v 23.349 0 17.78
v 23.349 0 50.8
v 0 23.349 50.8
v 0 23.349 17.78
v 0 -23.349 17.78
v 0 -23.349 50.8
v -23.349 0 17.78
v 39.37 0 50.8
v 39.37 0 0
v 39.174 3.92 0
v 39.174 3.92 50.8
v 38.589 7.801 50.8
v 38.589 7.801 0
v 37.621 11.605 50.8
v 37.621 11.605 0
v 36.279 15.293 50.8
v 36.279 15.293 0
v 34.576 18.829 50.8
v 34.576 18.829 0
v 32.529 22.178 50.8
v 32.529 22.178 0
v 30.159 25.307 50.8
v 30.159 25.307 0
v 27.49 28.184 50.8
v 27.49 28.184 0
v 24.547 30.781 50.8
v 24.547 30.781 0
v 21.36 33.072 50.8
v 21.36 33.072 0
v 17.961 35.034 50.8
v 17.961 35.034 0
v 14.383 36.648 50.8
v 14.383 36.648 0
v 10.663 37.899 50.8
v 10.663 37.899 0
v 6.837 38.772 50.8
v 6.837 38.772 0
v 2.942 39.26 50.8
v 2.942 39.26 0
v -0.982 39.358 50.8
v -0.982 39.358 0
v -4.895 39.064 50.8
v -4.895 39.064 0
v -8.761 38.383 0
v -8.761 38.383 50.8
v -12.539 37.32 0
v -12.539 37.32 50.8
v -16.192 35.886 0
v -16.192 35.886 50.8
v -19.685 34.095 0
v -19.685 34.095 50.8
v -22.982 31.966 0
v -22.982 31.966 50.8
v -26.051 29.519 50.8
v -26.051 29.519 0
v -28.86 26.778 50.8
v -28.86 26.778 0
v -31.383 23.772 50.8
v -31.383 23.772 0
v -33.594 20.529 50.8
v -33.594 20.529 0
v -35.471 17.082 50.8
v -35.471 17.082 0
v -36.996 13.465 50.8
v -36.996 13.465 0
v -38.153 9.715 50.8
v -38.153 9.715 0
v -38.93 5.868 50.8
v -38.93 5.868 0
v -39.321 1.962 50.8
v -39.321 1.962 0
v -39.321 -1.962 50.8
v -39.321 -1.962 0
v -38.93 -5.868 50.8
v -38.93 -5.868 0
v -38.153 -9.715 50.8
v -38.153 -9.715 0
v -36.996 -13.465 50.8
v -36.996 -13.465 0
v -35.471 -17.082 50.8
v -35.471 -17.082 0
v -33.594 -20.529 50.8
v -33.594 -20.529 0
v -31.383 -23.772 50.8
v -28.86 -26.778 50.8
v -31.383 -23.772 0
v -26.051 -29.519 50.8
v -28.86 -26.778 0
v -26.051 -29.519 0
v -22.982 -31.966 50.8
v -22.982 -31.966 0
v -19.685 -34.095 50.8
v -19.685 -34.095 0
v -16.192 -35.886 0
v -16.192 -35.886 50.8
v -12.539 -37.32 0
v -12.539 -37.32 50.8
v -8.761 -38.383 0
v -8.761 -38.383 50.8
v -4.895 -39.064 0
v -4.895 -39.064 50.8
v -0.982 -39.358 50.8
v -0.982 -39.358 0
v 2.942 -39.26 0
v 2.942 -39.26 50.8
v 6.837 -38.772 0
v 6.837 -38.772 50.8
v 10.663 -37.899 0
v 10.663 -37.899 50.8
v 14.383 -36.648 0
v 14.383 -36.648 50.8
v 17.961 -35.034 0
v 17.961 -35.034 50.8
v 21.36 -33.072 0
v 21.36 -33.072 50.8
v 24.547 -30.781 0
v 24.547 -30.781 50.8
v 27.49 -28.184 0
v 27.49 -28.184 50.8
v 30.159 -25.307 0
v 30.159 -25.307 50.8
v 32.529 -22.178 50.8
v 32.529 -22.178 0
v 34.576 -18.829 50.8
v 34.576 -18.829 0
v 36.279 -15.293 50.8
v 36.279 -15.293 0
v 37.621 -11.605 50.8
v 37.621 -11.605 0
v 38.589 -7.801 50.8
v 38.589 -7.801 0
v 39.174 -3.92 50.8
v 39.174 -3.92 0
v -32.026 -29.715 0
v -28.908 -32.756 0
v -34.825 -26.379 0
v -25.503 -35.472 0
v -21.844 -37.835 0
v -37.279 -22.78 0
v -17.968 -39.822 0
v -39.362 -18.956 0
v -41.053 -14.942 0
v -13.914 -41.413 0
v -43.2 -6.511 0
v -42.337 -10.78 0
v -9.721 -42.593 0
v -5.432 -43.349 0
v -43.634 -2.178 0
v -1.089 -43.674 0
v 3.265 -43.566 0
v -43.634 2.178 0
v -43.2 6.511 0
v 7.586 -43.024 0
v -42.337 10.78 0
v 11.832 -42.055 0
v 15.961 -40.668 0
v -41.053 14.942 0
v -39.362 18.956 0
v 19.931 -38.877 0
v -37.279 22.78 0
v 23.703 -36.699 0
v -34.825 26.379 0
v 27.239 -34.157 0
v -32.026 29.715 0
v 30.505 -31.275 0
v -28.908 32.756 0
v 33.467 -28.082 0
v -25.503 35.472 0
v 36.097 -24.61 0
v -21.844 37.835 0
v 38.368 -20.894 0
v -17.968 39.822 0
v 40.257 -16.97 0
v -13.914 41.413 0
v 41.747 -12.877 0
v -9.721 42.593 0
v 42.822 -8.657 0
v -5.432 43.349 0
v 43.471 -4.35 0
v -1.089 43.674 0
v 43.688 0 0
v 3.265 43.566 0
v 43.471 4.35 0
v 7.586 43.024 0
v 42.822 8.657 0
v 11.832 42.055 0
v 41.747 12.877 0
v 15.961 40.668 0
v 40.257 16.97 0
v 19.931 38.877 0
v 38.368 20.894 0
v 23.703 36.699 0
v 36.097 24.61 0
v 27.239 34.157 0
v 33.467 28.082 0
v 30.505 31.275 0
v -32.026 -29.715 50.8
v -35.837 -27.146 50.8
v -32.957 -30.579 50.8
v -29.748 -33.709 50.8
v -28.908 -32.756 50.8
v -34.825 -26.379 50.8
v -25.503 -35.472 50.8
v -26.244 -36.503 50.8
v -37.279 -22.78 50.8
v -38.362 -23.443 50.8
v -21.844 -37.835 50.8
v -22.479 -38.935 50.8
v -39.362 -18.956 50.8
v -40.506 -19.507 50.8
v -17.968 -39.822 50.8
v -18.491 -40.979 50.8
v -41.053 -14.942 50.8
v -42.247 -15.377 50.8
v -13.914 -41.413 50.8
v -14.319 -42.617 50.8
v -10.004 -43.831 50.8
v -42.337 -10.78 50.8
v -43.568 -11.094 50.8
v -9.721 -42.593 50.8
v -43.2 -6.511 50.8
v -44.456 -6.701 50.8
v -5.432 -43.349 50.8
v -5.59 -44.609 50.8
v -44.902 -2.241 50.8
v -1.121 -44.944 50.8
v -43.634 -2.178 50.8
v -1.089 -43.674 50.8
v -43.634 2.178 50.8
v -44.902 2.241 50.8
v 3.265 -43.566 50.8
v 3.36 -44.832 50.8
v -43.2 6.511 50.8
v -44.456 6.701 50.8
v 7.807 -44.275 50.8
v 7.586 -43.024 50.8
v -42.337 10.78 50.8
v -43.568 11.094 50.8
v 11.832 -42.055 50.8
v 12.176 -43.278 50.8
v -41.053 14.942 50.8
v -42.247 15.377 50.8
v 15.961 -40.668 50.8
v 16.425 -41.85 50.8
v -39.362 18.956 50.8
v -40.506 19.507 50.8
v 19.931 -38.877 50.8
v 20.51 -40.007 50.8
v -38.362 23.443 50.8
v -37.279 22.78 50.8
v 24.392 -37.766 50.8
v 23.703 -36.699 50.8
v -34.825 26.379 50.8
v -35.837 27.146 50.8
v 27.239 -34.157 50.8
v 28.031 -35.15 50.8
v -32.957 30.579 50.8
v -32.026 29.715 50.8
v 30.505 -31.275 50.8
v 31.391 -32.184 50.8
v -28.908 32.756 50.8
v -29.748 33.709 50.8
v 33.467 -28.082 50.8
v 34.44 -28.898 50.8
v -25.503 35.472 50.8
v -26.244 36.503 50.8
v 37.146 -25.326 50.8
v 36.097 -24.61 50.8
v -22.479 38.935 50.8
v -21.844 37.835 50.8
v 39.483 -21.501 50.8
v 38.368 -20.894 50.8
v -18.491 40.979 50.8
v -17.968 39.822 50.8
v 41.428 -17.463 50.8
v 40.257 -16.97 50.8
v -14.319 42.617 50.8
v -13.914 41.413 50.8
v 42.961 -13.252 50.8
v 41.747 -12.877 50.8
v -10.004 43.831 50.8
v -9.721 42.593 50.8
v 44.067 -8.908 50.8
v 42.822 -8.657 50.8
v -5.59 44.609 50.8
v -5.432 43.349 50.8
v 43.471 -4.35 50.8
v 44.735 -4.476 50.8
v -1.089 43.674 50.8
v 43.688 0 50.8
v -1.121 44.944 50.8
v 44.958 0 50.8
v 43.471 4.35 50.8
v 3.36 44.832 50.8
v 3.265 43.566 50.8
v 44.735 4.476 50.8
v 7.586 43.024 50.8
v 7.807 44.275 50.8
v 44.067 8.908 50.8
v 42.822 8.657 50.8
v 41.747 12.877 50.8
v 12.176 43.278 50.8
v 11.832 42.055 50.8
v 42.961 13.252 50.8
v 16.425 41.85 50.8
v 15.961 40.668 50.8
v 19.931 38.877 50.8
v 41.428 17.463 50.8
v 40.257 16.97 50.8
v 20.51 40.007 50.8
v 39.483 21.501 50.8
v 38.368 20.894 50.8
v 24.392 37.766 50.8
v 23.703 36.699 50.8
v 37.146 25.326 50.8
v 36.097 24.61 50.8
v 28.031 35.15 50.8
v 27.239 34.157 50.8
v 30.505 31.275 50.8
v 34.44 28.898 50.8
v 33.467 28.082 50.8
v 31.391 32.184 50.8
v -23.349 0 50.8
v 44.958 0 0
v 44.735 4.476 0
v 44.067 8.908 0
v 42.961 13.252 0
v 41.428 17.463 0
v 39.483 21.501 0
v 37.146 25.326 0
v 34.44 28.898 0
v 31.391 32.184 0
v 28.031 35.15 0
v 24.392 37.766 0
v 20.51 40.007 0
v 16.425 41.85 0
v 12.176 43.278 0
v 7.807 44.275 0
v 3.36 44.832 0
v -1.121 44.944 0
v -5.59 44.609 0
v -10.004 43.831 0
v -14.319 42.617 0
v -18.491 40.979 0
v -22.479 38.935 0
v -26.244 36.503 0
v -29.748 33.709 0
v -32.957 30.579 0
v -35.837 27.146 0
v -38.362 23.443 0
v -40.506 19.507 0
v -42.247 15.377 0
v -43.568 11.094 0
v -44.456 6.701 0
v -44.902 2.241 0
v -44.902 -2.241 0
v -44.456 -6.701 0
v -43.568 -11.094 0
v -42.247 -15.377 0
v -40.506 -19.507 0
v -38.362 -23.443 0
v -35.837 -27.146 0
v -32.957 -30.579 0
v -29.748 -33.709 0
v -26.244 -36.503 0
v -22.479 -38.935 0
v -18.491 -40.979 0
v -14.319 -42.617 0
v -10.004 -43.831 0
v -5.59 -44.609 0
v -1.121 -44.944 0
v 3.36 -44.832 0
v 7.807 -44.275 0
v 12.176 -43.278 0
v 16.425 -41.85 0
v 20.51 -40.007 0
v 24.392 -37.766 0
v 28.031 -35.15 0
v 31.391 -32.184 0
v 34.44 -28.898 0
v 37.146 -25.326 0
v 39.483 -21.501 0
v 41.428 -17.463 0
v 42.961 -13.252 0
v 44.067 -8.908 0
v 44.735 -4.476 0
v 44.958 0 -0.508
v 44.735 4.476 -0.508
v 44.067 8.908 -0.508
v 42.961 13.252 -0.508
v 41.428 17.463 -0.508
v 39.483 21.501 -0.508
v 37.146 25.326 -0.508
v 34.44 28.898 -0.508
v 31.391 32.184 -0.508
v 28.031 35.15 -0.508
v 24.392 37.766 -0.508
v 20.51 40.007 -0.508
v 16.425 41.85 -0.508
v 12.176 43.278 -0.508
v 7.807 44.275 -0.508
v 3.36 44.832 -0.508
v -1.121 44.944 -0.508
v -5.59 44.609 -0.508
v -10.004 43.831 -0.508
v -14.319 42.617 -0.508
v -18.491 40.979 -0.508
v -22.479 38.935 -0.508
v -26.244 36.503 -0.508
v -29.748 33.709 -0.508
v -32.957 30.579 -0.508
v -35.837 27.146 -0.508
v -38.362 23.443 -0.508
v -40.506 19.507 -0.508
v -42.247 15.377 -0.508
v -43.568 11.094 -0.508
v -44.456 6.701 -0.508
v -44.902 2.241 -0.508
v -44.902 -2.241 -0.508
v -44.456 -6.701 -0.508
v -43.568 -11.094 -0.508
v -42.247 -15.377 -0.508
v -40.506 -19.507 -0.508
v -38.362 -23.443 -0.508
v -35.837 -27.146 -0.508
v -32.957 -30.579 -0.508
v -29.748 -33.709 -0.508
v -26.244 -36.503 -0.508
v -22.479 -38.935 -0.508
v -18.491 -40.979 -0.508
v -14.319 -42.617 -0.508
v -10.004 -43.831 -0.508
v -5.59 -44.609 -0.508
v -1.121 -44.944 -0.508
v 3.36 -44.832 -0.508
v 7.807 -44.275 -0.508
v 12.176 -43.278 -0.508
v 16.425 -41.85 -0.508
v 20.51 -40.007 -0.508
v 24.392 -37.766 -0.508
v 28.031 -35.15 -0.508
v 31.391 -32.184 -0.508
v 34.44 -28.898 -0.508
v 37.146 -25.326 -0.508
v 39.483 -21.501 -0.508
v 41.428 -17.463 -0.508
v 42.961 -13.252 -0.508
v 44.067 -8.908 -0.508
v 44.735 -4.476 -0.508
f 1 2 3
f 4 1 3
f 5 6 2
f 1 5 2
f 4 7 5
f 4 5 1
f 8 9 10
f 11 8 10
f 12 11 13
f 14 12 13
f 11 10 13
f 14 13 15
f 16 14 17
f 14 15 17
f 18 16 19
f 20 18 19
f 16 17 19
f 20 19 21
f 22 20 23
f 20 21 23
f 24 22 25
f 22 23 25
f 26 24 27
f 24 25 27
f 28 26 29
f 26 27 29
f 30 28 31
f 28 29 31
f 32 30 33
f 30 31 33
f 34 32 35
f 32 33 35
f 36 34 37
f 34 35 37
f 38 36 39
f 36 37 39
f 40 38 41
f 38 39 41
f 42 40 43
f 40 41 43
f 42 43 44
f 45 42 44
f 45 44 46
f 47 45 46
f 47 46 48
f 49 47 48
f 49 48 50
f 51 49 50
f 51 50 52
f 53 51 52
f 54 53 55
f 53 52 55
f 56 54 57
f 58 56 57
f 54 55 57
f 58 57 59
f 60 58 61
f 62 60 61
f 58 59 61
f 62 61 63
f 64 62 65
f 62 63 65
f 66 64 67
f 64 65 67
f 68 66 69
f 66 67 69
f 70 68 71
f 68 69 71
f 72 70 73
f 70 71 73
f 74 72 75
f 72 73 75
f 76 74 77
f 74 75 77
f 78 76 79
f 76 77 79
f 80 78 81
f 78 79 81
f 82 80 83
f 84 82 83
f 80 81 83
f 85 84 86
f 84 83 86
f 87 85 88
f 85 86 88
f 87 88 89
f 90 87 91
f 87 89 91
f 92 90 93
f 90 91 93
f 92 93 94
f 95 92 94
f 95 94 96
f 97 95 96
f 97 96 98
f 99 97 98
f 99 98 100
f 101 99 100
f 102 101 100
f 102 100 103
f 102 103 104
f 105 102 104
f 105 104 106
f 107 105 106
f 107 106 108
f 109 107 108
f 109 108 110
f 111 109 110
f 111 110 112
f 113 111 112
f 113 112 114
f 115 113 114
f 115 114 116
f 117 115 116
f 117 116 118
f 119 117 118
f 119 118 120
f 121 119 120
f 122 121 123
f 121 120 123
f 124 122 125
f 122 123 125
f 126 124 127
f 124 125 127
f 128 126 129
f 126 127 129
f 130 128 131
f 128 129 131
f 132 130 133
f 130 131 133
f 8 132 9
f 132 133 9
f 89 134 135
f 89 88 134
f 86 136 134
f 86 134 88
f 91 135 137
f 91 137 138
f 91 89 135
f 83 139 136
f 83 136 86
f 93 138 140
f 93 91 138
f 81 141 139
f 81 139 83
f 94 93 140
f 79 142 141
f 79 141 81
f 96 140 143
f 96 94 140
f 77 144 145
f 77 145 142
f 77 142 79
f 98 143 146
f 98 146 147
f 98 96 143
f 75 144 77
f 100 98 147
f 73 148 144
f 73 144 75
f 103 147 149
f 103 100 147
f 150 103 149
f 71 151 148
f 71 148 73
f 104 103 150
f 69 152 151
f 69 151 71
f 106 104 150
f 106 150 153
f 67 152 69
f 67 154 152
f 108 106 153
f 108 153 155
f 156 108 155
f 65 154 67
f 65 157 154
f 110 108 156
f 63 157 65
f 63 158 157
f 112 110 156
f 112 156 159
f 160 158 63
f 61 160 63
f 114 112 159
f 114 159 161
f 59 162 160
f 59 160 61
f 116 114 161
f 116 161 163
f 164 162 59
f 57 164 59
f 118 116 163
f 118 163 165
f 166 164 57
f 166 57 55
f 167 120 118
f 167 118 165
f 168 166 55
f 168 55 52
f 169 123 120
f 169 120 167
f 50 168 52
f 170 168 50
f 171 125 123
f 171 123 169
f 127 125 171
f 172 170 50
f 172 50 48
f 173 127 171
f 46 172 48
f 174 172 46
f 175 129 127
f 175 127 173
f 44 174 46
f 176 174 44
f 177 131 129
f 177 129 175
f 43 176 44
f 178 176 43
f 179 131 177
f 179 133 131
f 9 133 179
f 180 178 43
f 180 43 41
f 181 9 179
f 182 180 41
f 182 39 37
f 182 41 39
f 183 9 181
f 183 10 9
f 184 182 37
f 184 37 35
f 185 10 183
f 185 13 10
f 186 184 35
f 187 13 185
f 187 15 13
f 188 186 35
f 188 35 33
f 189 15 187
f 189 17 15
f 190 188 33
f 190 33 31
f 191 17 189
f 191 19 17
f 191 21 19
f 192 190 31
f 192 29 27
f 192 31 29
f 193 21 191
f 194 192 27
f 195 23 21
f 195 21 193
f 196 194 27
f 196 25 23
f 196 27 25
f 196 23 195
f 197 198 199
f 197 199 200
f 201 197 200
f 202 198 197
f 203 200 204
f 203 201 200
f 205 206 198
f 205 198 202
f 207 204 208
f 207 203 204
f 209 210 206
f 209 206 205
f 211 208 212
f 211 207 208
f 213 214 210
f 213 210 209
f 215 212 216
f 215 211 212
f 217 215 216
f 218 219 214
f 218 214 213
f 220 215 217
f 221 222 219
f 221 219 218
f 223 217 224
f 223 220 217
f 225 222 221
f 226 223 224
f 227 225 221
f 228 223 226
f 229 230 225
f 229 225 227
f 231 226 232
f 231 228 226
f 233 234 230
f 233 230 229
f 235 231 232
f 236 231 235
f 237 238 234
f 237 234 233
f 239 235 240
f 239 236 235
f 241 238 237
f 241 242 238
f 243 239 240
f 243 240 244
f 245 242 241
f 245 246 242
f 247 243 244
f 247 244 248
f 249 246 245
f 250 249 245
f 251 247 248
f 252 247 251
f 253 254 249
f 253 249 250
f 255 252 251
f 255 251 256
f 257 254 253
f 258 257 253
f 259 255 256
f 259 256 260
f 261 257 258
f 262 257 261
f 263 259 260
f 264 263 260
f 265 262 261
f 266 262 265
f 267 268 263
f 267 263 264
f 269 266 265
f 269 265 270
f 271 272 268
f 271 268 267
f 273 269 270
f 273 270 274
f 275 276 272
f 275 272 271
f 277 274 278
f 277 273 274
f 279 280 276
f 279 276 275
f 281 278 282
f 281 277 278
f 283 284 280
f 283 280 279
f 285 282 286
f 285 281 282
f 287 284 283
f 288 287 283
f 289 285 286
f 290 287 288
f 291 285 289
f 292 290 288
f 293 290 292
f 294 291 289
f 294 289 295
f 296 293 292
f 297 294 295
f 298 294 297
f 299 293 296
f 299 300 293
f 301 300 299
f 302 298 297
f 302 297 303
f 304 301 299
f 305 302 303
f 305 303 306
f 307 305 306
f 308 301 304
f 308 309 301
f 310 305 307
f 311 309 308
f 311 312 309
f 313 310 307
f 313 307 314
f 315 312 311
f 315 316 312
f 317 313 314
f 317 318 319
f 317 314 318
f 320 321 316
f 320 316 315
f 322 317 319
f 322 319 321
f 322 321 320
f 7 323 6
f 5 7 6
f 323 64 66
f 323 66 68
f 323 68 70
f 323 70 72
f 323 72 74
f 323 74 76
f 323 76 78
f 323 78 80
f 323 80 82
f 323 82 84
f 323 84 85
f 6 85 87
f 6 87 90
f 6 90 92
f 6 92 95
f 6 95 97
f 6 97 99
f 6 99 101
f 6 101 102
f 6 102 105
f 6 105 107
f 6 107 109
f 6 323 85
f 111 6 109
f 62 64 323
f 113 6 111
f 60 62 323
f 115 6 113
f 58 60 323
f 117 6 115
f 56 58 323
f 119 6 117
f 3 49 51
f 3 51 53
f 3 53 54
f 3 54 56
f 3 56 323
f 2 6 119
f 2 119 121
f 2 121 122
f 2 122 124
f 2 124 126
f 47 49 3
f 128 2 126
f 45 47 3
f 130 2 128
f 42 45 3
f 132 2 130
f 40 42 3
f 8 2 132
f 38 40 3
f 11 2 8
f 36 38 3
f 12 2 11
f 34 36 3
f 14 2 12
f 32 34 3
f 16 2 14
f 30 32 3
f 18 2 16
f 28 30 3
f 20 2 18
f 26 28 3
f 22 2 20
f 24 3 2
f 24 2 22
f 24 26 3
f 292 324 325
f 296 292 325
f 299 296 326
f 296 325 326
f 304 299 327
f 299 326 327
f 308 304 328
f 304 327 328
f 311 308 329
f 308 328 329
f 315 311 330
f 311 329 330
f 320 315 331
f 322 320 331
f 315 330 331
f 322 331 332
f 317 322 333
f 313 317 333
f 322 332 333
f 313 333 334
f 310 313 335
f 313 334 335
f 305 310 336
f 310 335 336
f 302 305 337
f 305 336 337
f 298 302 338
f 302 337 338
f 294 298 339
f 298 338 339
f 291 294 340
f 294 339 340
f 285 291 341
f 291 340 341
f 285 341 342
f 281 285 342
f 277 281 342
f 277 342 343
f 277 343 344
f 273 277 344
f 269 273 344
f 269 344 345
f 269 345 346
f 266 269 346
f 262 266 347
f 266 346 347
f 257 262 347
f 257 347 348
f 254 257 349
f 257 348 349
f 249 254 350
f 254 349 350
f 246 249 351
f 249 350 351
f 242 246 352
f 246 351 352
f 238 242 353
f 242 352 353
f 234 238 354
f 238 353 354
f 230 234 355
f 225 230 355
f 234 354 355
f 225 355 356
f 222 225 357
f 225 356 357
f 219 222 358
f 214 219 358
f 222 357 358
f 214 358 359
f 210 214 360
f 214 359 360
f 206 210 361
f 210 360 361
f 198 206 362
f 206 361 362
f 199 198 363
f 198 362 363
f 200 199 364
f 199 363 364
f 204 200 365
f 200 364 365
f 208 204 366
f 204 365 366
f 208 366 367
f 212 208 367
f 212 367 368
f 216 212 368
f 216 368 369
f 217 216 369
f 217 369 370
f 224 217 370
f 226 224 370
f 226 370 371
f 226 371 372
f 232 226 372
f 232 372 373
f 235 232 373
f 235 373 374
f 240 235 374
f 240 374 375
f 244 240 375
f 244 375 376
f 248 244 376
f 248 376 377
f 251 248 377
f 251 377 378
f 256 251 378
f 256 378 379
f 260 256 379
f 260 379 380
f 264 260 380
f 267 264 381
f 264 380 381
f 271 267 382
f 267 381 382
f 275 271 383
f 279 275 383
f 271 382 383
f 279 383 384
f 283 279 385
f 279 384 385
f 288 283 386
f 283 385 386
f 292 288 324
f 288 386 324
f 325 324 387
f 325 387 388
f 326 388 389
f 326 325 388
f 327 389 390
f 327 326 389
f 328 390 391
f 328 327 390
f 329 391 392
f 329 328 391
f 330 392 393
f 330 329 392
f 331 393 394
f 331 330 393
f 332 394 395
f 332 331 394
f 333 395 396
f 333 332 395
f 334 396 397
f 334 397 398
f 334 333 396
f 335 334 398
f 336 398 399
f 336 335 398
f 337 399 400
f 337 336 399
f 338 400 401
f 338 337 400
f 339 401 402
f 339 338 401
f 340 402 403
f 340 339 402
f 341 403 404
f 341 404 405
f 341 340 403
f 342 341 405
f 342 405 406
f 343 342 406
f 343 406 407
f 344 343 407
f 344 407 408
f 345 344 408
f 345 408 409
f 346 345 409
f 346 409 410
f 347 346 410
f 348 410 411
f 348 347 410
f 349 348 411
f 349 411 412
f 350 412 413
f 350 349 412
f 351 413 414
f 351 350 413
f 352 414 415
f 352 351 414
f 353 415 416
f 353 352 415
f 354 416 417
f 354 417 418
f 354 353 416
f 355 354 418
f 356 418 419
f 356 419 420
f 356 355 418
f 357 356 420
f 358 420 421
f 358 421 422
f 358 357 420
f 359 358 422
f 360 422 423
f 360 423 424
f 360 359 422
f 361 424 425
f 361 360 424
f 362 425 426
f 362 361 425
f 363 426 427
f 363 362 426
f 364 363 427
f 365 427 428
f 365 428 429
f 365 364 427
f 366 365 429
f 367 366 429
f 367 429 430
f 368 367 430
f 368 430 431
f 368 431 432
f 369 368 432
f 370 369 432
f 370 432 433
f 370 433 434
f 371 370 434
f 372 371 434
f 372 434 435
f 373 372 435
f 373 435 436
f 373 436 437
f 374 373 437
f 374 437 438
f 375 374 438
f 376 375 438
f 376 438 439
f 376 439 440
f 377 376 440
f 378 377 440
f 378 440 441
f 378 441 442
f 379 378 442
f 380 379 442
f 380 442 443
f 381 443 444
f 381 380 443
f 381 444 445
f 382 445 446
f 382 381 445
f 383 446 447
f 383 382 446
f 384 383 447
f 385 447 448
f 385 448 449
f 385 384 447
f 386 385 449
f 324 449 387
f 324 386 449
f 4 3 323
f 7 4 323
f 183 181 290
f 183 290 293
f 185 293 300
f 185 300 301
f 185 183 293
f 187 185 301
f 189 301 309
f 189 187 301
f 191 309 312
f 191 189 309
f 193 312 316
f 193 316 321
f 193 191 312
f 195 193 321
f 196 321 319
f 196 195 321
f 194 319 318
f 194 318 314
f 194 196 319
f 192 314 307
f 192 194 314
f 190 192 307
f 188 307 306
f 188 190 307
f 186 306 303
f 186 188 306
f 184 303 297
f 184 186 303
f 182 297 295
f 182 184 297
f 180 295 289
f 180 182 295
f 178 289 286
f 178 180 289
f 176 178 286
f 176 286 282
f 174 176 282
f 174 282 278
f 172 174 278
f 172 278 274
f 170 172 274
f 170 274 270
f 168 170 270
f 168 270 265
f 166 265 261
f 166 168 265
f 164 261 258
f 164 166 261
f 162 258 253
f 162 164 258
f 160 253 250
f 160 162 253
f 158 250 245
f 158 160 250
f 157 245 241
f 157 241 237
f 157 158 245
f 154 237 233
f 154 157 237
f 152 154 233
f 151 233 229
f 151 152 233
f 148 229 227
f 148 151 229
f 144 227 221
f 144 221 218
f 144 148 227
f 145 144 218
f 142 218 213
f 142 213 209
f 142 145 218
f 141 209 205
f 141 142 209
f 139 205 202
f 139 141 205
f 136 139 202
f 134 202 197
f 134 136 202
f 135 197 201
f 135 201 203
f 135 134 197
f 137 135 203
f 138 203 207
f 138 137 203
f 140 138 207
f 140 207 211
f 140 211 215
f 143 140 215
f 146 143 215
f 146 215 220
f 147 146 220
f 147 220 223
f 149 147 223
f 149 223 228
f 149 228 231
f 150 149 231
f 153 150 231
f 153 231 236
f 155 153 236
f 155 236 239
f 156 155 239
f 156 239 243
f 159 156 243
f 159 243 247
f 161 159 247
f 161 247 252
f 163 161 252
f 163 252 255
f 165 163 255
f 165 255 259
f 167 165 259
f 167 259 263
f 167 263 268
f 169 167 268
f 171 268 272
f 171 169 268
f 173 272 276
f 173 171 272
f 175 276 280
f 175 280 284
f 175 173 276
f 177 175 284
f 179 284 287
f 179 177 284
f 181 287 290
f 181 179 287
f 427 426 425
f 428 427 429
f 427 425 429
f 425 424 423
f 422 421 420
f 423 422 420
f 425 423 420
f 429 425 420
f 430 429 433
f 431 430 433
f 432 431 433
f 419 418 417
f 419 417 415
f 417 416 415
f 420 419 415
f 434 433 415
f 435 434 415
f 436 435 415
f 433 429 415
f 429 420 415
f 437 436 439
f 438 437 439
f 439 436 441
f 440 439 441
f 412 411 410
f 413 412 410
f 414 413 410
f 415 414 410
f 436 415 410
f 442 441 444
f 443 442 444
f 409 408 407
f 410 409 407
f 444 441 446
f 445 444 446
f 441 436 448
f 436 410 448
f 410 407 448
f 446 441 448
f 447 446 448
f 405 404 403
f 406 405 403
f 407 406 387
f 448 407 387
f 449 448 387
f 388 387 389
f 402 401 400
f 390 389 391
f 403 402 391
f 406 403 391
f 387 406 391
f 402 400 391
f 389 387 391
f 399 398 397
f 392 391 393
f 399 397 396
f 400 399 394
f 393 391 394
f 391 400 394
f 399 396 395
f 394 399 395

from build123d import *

# Parameters (mm, degrees)
F2_R     = 44.958
F3_DEPTH = 0.508
F4_R     = 39.37
F5_DEPTH = 50.8
F7_DEPTH = 33.02
F8_R     = 44.958
F8_R_2   = 43.688
F9_DEPTH = 50.8


# Not quite as in the source:
# - the program builds the solid bodies; features that only make, move or delete a surface that nothing else refers to are left out


with BuildPart() as f3:
    # F2 (on Top) → F3 (new body)
    with BuildSketch(Plane.XY):
        Circle(F2_R)
    extrude(amount=-F3_DEPTH)

    # F4 (on Top) → F5 (join)
    with BuildSketch(Plane.XY):
        Circle(F4_R)
    extrude(amount=F5_DEPTH)

    # F6 (on face) → F7 (cut)
    with BuildSketch(Plane.XY.offset(50.8)):
        Polygon((23.3486659148, 0), (0, 23.3486659148), (-23.3486659148, 0), (0, -23.3486659148), align=None)
    extrude(amount=-F7_DEPTH, mode=Mode.SUBTRACT)

    # F8 (on Top) → F9 (join)
    with BuildSketch(Plane.XY):
        Circle(F8_R)
        Circle(F8_R_2, mode=Mode.SUBTRACT)
    extrude(amount=F9_DEPTH)


solid = f3.part
